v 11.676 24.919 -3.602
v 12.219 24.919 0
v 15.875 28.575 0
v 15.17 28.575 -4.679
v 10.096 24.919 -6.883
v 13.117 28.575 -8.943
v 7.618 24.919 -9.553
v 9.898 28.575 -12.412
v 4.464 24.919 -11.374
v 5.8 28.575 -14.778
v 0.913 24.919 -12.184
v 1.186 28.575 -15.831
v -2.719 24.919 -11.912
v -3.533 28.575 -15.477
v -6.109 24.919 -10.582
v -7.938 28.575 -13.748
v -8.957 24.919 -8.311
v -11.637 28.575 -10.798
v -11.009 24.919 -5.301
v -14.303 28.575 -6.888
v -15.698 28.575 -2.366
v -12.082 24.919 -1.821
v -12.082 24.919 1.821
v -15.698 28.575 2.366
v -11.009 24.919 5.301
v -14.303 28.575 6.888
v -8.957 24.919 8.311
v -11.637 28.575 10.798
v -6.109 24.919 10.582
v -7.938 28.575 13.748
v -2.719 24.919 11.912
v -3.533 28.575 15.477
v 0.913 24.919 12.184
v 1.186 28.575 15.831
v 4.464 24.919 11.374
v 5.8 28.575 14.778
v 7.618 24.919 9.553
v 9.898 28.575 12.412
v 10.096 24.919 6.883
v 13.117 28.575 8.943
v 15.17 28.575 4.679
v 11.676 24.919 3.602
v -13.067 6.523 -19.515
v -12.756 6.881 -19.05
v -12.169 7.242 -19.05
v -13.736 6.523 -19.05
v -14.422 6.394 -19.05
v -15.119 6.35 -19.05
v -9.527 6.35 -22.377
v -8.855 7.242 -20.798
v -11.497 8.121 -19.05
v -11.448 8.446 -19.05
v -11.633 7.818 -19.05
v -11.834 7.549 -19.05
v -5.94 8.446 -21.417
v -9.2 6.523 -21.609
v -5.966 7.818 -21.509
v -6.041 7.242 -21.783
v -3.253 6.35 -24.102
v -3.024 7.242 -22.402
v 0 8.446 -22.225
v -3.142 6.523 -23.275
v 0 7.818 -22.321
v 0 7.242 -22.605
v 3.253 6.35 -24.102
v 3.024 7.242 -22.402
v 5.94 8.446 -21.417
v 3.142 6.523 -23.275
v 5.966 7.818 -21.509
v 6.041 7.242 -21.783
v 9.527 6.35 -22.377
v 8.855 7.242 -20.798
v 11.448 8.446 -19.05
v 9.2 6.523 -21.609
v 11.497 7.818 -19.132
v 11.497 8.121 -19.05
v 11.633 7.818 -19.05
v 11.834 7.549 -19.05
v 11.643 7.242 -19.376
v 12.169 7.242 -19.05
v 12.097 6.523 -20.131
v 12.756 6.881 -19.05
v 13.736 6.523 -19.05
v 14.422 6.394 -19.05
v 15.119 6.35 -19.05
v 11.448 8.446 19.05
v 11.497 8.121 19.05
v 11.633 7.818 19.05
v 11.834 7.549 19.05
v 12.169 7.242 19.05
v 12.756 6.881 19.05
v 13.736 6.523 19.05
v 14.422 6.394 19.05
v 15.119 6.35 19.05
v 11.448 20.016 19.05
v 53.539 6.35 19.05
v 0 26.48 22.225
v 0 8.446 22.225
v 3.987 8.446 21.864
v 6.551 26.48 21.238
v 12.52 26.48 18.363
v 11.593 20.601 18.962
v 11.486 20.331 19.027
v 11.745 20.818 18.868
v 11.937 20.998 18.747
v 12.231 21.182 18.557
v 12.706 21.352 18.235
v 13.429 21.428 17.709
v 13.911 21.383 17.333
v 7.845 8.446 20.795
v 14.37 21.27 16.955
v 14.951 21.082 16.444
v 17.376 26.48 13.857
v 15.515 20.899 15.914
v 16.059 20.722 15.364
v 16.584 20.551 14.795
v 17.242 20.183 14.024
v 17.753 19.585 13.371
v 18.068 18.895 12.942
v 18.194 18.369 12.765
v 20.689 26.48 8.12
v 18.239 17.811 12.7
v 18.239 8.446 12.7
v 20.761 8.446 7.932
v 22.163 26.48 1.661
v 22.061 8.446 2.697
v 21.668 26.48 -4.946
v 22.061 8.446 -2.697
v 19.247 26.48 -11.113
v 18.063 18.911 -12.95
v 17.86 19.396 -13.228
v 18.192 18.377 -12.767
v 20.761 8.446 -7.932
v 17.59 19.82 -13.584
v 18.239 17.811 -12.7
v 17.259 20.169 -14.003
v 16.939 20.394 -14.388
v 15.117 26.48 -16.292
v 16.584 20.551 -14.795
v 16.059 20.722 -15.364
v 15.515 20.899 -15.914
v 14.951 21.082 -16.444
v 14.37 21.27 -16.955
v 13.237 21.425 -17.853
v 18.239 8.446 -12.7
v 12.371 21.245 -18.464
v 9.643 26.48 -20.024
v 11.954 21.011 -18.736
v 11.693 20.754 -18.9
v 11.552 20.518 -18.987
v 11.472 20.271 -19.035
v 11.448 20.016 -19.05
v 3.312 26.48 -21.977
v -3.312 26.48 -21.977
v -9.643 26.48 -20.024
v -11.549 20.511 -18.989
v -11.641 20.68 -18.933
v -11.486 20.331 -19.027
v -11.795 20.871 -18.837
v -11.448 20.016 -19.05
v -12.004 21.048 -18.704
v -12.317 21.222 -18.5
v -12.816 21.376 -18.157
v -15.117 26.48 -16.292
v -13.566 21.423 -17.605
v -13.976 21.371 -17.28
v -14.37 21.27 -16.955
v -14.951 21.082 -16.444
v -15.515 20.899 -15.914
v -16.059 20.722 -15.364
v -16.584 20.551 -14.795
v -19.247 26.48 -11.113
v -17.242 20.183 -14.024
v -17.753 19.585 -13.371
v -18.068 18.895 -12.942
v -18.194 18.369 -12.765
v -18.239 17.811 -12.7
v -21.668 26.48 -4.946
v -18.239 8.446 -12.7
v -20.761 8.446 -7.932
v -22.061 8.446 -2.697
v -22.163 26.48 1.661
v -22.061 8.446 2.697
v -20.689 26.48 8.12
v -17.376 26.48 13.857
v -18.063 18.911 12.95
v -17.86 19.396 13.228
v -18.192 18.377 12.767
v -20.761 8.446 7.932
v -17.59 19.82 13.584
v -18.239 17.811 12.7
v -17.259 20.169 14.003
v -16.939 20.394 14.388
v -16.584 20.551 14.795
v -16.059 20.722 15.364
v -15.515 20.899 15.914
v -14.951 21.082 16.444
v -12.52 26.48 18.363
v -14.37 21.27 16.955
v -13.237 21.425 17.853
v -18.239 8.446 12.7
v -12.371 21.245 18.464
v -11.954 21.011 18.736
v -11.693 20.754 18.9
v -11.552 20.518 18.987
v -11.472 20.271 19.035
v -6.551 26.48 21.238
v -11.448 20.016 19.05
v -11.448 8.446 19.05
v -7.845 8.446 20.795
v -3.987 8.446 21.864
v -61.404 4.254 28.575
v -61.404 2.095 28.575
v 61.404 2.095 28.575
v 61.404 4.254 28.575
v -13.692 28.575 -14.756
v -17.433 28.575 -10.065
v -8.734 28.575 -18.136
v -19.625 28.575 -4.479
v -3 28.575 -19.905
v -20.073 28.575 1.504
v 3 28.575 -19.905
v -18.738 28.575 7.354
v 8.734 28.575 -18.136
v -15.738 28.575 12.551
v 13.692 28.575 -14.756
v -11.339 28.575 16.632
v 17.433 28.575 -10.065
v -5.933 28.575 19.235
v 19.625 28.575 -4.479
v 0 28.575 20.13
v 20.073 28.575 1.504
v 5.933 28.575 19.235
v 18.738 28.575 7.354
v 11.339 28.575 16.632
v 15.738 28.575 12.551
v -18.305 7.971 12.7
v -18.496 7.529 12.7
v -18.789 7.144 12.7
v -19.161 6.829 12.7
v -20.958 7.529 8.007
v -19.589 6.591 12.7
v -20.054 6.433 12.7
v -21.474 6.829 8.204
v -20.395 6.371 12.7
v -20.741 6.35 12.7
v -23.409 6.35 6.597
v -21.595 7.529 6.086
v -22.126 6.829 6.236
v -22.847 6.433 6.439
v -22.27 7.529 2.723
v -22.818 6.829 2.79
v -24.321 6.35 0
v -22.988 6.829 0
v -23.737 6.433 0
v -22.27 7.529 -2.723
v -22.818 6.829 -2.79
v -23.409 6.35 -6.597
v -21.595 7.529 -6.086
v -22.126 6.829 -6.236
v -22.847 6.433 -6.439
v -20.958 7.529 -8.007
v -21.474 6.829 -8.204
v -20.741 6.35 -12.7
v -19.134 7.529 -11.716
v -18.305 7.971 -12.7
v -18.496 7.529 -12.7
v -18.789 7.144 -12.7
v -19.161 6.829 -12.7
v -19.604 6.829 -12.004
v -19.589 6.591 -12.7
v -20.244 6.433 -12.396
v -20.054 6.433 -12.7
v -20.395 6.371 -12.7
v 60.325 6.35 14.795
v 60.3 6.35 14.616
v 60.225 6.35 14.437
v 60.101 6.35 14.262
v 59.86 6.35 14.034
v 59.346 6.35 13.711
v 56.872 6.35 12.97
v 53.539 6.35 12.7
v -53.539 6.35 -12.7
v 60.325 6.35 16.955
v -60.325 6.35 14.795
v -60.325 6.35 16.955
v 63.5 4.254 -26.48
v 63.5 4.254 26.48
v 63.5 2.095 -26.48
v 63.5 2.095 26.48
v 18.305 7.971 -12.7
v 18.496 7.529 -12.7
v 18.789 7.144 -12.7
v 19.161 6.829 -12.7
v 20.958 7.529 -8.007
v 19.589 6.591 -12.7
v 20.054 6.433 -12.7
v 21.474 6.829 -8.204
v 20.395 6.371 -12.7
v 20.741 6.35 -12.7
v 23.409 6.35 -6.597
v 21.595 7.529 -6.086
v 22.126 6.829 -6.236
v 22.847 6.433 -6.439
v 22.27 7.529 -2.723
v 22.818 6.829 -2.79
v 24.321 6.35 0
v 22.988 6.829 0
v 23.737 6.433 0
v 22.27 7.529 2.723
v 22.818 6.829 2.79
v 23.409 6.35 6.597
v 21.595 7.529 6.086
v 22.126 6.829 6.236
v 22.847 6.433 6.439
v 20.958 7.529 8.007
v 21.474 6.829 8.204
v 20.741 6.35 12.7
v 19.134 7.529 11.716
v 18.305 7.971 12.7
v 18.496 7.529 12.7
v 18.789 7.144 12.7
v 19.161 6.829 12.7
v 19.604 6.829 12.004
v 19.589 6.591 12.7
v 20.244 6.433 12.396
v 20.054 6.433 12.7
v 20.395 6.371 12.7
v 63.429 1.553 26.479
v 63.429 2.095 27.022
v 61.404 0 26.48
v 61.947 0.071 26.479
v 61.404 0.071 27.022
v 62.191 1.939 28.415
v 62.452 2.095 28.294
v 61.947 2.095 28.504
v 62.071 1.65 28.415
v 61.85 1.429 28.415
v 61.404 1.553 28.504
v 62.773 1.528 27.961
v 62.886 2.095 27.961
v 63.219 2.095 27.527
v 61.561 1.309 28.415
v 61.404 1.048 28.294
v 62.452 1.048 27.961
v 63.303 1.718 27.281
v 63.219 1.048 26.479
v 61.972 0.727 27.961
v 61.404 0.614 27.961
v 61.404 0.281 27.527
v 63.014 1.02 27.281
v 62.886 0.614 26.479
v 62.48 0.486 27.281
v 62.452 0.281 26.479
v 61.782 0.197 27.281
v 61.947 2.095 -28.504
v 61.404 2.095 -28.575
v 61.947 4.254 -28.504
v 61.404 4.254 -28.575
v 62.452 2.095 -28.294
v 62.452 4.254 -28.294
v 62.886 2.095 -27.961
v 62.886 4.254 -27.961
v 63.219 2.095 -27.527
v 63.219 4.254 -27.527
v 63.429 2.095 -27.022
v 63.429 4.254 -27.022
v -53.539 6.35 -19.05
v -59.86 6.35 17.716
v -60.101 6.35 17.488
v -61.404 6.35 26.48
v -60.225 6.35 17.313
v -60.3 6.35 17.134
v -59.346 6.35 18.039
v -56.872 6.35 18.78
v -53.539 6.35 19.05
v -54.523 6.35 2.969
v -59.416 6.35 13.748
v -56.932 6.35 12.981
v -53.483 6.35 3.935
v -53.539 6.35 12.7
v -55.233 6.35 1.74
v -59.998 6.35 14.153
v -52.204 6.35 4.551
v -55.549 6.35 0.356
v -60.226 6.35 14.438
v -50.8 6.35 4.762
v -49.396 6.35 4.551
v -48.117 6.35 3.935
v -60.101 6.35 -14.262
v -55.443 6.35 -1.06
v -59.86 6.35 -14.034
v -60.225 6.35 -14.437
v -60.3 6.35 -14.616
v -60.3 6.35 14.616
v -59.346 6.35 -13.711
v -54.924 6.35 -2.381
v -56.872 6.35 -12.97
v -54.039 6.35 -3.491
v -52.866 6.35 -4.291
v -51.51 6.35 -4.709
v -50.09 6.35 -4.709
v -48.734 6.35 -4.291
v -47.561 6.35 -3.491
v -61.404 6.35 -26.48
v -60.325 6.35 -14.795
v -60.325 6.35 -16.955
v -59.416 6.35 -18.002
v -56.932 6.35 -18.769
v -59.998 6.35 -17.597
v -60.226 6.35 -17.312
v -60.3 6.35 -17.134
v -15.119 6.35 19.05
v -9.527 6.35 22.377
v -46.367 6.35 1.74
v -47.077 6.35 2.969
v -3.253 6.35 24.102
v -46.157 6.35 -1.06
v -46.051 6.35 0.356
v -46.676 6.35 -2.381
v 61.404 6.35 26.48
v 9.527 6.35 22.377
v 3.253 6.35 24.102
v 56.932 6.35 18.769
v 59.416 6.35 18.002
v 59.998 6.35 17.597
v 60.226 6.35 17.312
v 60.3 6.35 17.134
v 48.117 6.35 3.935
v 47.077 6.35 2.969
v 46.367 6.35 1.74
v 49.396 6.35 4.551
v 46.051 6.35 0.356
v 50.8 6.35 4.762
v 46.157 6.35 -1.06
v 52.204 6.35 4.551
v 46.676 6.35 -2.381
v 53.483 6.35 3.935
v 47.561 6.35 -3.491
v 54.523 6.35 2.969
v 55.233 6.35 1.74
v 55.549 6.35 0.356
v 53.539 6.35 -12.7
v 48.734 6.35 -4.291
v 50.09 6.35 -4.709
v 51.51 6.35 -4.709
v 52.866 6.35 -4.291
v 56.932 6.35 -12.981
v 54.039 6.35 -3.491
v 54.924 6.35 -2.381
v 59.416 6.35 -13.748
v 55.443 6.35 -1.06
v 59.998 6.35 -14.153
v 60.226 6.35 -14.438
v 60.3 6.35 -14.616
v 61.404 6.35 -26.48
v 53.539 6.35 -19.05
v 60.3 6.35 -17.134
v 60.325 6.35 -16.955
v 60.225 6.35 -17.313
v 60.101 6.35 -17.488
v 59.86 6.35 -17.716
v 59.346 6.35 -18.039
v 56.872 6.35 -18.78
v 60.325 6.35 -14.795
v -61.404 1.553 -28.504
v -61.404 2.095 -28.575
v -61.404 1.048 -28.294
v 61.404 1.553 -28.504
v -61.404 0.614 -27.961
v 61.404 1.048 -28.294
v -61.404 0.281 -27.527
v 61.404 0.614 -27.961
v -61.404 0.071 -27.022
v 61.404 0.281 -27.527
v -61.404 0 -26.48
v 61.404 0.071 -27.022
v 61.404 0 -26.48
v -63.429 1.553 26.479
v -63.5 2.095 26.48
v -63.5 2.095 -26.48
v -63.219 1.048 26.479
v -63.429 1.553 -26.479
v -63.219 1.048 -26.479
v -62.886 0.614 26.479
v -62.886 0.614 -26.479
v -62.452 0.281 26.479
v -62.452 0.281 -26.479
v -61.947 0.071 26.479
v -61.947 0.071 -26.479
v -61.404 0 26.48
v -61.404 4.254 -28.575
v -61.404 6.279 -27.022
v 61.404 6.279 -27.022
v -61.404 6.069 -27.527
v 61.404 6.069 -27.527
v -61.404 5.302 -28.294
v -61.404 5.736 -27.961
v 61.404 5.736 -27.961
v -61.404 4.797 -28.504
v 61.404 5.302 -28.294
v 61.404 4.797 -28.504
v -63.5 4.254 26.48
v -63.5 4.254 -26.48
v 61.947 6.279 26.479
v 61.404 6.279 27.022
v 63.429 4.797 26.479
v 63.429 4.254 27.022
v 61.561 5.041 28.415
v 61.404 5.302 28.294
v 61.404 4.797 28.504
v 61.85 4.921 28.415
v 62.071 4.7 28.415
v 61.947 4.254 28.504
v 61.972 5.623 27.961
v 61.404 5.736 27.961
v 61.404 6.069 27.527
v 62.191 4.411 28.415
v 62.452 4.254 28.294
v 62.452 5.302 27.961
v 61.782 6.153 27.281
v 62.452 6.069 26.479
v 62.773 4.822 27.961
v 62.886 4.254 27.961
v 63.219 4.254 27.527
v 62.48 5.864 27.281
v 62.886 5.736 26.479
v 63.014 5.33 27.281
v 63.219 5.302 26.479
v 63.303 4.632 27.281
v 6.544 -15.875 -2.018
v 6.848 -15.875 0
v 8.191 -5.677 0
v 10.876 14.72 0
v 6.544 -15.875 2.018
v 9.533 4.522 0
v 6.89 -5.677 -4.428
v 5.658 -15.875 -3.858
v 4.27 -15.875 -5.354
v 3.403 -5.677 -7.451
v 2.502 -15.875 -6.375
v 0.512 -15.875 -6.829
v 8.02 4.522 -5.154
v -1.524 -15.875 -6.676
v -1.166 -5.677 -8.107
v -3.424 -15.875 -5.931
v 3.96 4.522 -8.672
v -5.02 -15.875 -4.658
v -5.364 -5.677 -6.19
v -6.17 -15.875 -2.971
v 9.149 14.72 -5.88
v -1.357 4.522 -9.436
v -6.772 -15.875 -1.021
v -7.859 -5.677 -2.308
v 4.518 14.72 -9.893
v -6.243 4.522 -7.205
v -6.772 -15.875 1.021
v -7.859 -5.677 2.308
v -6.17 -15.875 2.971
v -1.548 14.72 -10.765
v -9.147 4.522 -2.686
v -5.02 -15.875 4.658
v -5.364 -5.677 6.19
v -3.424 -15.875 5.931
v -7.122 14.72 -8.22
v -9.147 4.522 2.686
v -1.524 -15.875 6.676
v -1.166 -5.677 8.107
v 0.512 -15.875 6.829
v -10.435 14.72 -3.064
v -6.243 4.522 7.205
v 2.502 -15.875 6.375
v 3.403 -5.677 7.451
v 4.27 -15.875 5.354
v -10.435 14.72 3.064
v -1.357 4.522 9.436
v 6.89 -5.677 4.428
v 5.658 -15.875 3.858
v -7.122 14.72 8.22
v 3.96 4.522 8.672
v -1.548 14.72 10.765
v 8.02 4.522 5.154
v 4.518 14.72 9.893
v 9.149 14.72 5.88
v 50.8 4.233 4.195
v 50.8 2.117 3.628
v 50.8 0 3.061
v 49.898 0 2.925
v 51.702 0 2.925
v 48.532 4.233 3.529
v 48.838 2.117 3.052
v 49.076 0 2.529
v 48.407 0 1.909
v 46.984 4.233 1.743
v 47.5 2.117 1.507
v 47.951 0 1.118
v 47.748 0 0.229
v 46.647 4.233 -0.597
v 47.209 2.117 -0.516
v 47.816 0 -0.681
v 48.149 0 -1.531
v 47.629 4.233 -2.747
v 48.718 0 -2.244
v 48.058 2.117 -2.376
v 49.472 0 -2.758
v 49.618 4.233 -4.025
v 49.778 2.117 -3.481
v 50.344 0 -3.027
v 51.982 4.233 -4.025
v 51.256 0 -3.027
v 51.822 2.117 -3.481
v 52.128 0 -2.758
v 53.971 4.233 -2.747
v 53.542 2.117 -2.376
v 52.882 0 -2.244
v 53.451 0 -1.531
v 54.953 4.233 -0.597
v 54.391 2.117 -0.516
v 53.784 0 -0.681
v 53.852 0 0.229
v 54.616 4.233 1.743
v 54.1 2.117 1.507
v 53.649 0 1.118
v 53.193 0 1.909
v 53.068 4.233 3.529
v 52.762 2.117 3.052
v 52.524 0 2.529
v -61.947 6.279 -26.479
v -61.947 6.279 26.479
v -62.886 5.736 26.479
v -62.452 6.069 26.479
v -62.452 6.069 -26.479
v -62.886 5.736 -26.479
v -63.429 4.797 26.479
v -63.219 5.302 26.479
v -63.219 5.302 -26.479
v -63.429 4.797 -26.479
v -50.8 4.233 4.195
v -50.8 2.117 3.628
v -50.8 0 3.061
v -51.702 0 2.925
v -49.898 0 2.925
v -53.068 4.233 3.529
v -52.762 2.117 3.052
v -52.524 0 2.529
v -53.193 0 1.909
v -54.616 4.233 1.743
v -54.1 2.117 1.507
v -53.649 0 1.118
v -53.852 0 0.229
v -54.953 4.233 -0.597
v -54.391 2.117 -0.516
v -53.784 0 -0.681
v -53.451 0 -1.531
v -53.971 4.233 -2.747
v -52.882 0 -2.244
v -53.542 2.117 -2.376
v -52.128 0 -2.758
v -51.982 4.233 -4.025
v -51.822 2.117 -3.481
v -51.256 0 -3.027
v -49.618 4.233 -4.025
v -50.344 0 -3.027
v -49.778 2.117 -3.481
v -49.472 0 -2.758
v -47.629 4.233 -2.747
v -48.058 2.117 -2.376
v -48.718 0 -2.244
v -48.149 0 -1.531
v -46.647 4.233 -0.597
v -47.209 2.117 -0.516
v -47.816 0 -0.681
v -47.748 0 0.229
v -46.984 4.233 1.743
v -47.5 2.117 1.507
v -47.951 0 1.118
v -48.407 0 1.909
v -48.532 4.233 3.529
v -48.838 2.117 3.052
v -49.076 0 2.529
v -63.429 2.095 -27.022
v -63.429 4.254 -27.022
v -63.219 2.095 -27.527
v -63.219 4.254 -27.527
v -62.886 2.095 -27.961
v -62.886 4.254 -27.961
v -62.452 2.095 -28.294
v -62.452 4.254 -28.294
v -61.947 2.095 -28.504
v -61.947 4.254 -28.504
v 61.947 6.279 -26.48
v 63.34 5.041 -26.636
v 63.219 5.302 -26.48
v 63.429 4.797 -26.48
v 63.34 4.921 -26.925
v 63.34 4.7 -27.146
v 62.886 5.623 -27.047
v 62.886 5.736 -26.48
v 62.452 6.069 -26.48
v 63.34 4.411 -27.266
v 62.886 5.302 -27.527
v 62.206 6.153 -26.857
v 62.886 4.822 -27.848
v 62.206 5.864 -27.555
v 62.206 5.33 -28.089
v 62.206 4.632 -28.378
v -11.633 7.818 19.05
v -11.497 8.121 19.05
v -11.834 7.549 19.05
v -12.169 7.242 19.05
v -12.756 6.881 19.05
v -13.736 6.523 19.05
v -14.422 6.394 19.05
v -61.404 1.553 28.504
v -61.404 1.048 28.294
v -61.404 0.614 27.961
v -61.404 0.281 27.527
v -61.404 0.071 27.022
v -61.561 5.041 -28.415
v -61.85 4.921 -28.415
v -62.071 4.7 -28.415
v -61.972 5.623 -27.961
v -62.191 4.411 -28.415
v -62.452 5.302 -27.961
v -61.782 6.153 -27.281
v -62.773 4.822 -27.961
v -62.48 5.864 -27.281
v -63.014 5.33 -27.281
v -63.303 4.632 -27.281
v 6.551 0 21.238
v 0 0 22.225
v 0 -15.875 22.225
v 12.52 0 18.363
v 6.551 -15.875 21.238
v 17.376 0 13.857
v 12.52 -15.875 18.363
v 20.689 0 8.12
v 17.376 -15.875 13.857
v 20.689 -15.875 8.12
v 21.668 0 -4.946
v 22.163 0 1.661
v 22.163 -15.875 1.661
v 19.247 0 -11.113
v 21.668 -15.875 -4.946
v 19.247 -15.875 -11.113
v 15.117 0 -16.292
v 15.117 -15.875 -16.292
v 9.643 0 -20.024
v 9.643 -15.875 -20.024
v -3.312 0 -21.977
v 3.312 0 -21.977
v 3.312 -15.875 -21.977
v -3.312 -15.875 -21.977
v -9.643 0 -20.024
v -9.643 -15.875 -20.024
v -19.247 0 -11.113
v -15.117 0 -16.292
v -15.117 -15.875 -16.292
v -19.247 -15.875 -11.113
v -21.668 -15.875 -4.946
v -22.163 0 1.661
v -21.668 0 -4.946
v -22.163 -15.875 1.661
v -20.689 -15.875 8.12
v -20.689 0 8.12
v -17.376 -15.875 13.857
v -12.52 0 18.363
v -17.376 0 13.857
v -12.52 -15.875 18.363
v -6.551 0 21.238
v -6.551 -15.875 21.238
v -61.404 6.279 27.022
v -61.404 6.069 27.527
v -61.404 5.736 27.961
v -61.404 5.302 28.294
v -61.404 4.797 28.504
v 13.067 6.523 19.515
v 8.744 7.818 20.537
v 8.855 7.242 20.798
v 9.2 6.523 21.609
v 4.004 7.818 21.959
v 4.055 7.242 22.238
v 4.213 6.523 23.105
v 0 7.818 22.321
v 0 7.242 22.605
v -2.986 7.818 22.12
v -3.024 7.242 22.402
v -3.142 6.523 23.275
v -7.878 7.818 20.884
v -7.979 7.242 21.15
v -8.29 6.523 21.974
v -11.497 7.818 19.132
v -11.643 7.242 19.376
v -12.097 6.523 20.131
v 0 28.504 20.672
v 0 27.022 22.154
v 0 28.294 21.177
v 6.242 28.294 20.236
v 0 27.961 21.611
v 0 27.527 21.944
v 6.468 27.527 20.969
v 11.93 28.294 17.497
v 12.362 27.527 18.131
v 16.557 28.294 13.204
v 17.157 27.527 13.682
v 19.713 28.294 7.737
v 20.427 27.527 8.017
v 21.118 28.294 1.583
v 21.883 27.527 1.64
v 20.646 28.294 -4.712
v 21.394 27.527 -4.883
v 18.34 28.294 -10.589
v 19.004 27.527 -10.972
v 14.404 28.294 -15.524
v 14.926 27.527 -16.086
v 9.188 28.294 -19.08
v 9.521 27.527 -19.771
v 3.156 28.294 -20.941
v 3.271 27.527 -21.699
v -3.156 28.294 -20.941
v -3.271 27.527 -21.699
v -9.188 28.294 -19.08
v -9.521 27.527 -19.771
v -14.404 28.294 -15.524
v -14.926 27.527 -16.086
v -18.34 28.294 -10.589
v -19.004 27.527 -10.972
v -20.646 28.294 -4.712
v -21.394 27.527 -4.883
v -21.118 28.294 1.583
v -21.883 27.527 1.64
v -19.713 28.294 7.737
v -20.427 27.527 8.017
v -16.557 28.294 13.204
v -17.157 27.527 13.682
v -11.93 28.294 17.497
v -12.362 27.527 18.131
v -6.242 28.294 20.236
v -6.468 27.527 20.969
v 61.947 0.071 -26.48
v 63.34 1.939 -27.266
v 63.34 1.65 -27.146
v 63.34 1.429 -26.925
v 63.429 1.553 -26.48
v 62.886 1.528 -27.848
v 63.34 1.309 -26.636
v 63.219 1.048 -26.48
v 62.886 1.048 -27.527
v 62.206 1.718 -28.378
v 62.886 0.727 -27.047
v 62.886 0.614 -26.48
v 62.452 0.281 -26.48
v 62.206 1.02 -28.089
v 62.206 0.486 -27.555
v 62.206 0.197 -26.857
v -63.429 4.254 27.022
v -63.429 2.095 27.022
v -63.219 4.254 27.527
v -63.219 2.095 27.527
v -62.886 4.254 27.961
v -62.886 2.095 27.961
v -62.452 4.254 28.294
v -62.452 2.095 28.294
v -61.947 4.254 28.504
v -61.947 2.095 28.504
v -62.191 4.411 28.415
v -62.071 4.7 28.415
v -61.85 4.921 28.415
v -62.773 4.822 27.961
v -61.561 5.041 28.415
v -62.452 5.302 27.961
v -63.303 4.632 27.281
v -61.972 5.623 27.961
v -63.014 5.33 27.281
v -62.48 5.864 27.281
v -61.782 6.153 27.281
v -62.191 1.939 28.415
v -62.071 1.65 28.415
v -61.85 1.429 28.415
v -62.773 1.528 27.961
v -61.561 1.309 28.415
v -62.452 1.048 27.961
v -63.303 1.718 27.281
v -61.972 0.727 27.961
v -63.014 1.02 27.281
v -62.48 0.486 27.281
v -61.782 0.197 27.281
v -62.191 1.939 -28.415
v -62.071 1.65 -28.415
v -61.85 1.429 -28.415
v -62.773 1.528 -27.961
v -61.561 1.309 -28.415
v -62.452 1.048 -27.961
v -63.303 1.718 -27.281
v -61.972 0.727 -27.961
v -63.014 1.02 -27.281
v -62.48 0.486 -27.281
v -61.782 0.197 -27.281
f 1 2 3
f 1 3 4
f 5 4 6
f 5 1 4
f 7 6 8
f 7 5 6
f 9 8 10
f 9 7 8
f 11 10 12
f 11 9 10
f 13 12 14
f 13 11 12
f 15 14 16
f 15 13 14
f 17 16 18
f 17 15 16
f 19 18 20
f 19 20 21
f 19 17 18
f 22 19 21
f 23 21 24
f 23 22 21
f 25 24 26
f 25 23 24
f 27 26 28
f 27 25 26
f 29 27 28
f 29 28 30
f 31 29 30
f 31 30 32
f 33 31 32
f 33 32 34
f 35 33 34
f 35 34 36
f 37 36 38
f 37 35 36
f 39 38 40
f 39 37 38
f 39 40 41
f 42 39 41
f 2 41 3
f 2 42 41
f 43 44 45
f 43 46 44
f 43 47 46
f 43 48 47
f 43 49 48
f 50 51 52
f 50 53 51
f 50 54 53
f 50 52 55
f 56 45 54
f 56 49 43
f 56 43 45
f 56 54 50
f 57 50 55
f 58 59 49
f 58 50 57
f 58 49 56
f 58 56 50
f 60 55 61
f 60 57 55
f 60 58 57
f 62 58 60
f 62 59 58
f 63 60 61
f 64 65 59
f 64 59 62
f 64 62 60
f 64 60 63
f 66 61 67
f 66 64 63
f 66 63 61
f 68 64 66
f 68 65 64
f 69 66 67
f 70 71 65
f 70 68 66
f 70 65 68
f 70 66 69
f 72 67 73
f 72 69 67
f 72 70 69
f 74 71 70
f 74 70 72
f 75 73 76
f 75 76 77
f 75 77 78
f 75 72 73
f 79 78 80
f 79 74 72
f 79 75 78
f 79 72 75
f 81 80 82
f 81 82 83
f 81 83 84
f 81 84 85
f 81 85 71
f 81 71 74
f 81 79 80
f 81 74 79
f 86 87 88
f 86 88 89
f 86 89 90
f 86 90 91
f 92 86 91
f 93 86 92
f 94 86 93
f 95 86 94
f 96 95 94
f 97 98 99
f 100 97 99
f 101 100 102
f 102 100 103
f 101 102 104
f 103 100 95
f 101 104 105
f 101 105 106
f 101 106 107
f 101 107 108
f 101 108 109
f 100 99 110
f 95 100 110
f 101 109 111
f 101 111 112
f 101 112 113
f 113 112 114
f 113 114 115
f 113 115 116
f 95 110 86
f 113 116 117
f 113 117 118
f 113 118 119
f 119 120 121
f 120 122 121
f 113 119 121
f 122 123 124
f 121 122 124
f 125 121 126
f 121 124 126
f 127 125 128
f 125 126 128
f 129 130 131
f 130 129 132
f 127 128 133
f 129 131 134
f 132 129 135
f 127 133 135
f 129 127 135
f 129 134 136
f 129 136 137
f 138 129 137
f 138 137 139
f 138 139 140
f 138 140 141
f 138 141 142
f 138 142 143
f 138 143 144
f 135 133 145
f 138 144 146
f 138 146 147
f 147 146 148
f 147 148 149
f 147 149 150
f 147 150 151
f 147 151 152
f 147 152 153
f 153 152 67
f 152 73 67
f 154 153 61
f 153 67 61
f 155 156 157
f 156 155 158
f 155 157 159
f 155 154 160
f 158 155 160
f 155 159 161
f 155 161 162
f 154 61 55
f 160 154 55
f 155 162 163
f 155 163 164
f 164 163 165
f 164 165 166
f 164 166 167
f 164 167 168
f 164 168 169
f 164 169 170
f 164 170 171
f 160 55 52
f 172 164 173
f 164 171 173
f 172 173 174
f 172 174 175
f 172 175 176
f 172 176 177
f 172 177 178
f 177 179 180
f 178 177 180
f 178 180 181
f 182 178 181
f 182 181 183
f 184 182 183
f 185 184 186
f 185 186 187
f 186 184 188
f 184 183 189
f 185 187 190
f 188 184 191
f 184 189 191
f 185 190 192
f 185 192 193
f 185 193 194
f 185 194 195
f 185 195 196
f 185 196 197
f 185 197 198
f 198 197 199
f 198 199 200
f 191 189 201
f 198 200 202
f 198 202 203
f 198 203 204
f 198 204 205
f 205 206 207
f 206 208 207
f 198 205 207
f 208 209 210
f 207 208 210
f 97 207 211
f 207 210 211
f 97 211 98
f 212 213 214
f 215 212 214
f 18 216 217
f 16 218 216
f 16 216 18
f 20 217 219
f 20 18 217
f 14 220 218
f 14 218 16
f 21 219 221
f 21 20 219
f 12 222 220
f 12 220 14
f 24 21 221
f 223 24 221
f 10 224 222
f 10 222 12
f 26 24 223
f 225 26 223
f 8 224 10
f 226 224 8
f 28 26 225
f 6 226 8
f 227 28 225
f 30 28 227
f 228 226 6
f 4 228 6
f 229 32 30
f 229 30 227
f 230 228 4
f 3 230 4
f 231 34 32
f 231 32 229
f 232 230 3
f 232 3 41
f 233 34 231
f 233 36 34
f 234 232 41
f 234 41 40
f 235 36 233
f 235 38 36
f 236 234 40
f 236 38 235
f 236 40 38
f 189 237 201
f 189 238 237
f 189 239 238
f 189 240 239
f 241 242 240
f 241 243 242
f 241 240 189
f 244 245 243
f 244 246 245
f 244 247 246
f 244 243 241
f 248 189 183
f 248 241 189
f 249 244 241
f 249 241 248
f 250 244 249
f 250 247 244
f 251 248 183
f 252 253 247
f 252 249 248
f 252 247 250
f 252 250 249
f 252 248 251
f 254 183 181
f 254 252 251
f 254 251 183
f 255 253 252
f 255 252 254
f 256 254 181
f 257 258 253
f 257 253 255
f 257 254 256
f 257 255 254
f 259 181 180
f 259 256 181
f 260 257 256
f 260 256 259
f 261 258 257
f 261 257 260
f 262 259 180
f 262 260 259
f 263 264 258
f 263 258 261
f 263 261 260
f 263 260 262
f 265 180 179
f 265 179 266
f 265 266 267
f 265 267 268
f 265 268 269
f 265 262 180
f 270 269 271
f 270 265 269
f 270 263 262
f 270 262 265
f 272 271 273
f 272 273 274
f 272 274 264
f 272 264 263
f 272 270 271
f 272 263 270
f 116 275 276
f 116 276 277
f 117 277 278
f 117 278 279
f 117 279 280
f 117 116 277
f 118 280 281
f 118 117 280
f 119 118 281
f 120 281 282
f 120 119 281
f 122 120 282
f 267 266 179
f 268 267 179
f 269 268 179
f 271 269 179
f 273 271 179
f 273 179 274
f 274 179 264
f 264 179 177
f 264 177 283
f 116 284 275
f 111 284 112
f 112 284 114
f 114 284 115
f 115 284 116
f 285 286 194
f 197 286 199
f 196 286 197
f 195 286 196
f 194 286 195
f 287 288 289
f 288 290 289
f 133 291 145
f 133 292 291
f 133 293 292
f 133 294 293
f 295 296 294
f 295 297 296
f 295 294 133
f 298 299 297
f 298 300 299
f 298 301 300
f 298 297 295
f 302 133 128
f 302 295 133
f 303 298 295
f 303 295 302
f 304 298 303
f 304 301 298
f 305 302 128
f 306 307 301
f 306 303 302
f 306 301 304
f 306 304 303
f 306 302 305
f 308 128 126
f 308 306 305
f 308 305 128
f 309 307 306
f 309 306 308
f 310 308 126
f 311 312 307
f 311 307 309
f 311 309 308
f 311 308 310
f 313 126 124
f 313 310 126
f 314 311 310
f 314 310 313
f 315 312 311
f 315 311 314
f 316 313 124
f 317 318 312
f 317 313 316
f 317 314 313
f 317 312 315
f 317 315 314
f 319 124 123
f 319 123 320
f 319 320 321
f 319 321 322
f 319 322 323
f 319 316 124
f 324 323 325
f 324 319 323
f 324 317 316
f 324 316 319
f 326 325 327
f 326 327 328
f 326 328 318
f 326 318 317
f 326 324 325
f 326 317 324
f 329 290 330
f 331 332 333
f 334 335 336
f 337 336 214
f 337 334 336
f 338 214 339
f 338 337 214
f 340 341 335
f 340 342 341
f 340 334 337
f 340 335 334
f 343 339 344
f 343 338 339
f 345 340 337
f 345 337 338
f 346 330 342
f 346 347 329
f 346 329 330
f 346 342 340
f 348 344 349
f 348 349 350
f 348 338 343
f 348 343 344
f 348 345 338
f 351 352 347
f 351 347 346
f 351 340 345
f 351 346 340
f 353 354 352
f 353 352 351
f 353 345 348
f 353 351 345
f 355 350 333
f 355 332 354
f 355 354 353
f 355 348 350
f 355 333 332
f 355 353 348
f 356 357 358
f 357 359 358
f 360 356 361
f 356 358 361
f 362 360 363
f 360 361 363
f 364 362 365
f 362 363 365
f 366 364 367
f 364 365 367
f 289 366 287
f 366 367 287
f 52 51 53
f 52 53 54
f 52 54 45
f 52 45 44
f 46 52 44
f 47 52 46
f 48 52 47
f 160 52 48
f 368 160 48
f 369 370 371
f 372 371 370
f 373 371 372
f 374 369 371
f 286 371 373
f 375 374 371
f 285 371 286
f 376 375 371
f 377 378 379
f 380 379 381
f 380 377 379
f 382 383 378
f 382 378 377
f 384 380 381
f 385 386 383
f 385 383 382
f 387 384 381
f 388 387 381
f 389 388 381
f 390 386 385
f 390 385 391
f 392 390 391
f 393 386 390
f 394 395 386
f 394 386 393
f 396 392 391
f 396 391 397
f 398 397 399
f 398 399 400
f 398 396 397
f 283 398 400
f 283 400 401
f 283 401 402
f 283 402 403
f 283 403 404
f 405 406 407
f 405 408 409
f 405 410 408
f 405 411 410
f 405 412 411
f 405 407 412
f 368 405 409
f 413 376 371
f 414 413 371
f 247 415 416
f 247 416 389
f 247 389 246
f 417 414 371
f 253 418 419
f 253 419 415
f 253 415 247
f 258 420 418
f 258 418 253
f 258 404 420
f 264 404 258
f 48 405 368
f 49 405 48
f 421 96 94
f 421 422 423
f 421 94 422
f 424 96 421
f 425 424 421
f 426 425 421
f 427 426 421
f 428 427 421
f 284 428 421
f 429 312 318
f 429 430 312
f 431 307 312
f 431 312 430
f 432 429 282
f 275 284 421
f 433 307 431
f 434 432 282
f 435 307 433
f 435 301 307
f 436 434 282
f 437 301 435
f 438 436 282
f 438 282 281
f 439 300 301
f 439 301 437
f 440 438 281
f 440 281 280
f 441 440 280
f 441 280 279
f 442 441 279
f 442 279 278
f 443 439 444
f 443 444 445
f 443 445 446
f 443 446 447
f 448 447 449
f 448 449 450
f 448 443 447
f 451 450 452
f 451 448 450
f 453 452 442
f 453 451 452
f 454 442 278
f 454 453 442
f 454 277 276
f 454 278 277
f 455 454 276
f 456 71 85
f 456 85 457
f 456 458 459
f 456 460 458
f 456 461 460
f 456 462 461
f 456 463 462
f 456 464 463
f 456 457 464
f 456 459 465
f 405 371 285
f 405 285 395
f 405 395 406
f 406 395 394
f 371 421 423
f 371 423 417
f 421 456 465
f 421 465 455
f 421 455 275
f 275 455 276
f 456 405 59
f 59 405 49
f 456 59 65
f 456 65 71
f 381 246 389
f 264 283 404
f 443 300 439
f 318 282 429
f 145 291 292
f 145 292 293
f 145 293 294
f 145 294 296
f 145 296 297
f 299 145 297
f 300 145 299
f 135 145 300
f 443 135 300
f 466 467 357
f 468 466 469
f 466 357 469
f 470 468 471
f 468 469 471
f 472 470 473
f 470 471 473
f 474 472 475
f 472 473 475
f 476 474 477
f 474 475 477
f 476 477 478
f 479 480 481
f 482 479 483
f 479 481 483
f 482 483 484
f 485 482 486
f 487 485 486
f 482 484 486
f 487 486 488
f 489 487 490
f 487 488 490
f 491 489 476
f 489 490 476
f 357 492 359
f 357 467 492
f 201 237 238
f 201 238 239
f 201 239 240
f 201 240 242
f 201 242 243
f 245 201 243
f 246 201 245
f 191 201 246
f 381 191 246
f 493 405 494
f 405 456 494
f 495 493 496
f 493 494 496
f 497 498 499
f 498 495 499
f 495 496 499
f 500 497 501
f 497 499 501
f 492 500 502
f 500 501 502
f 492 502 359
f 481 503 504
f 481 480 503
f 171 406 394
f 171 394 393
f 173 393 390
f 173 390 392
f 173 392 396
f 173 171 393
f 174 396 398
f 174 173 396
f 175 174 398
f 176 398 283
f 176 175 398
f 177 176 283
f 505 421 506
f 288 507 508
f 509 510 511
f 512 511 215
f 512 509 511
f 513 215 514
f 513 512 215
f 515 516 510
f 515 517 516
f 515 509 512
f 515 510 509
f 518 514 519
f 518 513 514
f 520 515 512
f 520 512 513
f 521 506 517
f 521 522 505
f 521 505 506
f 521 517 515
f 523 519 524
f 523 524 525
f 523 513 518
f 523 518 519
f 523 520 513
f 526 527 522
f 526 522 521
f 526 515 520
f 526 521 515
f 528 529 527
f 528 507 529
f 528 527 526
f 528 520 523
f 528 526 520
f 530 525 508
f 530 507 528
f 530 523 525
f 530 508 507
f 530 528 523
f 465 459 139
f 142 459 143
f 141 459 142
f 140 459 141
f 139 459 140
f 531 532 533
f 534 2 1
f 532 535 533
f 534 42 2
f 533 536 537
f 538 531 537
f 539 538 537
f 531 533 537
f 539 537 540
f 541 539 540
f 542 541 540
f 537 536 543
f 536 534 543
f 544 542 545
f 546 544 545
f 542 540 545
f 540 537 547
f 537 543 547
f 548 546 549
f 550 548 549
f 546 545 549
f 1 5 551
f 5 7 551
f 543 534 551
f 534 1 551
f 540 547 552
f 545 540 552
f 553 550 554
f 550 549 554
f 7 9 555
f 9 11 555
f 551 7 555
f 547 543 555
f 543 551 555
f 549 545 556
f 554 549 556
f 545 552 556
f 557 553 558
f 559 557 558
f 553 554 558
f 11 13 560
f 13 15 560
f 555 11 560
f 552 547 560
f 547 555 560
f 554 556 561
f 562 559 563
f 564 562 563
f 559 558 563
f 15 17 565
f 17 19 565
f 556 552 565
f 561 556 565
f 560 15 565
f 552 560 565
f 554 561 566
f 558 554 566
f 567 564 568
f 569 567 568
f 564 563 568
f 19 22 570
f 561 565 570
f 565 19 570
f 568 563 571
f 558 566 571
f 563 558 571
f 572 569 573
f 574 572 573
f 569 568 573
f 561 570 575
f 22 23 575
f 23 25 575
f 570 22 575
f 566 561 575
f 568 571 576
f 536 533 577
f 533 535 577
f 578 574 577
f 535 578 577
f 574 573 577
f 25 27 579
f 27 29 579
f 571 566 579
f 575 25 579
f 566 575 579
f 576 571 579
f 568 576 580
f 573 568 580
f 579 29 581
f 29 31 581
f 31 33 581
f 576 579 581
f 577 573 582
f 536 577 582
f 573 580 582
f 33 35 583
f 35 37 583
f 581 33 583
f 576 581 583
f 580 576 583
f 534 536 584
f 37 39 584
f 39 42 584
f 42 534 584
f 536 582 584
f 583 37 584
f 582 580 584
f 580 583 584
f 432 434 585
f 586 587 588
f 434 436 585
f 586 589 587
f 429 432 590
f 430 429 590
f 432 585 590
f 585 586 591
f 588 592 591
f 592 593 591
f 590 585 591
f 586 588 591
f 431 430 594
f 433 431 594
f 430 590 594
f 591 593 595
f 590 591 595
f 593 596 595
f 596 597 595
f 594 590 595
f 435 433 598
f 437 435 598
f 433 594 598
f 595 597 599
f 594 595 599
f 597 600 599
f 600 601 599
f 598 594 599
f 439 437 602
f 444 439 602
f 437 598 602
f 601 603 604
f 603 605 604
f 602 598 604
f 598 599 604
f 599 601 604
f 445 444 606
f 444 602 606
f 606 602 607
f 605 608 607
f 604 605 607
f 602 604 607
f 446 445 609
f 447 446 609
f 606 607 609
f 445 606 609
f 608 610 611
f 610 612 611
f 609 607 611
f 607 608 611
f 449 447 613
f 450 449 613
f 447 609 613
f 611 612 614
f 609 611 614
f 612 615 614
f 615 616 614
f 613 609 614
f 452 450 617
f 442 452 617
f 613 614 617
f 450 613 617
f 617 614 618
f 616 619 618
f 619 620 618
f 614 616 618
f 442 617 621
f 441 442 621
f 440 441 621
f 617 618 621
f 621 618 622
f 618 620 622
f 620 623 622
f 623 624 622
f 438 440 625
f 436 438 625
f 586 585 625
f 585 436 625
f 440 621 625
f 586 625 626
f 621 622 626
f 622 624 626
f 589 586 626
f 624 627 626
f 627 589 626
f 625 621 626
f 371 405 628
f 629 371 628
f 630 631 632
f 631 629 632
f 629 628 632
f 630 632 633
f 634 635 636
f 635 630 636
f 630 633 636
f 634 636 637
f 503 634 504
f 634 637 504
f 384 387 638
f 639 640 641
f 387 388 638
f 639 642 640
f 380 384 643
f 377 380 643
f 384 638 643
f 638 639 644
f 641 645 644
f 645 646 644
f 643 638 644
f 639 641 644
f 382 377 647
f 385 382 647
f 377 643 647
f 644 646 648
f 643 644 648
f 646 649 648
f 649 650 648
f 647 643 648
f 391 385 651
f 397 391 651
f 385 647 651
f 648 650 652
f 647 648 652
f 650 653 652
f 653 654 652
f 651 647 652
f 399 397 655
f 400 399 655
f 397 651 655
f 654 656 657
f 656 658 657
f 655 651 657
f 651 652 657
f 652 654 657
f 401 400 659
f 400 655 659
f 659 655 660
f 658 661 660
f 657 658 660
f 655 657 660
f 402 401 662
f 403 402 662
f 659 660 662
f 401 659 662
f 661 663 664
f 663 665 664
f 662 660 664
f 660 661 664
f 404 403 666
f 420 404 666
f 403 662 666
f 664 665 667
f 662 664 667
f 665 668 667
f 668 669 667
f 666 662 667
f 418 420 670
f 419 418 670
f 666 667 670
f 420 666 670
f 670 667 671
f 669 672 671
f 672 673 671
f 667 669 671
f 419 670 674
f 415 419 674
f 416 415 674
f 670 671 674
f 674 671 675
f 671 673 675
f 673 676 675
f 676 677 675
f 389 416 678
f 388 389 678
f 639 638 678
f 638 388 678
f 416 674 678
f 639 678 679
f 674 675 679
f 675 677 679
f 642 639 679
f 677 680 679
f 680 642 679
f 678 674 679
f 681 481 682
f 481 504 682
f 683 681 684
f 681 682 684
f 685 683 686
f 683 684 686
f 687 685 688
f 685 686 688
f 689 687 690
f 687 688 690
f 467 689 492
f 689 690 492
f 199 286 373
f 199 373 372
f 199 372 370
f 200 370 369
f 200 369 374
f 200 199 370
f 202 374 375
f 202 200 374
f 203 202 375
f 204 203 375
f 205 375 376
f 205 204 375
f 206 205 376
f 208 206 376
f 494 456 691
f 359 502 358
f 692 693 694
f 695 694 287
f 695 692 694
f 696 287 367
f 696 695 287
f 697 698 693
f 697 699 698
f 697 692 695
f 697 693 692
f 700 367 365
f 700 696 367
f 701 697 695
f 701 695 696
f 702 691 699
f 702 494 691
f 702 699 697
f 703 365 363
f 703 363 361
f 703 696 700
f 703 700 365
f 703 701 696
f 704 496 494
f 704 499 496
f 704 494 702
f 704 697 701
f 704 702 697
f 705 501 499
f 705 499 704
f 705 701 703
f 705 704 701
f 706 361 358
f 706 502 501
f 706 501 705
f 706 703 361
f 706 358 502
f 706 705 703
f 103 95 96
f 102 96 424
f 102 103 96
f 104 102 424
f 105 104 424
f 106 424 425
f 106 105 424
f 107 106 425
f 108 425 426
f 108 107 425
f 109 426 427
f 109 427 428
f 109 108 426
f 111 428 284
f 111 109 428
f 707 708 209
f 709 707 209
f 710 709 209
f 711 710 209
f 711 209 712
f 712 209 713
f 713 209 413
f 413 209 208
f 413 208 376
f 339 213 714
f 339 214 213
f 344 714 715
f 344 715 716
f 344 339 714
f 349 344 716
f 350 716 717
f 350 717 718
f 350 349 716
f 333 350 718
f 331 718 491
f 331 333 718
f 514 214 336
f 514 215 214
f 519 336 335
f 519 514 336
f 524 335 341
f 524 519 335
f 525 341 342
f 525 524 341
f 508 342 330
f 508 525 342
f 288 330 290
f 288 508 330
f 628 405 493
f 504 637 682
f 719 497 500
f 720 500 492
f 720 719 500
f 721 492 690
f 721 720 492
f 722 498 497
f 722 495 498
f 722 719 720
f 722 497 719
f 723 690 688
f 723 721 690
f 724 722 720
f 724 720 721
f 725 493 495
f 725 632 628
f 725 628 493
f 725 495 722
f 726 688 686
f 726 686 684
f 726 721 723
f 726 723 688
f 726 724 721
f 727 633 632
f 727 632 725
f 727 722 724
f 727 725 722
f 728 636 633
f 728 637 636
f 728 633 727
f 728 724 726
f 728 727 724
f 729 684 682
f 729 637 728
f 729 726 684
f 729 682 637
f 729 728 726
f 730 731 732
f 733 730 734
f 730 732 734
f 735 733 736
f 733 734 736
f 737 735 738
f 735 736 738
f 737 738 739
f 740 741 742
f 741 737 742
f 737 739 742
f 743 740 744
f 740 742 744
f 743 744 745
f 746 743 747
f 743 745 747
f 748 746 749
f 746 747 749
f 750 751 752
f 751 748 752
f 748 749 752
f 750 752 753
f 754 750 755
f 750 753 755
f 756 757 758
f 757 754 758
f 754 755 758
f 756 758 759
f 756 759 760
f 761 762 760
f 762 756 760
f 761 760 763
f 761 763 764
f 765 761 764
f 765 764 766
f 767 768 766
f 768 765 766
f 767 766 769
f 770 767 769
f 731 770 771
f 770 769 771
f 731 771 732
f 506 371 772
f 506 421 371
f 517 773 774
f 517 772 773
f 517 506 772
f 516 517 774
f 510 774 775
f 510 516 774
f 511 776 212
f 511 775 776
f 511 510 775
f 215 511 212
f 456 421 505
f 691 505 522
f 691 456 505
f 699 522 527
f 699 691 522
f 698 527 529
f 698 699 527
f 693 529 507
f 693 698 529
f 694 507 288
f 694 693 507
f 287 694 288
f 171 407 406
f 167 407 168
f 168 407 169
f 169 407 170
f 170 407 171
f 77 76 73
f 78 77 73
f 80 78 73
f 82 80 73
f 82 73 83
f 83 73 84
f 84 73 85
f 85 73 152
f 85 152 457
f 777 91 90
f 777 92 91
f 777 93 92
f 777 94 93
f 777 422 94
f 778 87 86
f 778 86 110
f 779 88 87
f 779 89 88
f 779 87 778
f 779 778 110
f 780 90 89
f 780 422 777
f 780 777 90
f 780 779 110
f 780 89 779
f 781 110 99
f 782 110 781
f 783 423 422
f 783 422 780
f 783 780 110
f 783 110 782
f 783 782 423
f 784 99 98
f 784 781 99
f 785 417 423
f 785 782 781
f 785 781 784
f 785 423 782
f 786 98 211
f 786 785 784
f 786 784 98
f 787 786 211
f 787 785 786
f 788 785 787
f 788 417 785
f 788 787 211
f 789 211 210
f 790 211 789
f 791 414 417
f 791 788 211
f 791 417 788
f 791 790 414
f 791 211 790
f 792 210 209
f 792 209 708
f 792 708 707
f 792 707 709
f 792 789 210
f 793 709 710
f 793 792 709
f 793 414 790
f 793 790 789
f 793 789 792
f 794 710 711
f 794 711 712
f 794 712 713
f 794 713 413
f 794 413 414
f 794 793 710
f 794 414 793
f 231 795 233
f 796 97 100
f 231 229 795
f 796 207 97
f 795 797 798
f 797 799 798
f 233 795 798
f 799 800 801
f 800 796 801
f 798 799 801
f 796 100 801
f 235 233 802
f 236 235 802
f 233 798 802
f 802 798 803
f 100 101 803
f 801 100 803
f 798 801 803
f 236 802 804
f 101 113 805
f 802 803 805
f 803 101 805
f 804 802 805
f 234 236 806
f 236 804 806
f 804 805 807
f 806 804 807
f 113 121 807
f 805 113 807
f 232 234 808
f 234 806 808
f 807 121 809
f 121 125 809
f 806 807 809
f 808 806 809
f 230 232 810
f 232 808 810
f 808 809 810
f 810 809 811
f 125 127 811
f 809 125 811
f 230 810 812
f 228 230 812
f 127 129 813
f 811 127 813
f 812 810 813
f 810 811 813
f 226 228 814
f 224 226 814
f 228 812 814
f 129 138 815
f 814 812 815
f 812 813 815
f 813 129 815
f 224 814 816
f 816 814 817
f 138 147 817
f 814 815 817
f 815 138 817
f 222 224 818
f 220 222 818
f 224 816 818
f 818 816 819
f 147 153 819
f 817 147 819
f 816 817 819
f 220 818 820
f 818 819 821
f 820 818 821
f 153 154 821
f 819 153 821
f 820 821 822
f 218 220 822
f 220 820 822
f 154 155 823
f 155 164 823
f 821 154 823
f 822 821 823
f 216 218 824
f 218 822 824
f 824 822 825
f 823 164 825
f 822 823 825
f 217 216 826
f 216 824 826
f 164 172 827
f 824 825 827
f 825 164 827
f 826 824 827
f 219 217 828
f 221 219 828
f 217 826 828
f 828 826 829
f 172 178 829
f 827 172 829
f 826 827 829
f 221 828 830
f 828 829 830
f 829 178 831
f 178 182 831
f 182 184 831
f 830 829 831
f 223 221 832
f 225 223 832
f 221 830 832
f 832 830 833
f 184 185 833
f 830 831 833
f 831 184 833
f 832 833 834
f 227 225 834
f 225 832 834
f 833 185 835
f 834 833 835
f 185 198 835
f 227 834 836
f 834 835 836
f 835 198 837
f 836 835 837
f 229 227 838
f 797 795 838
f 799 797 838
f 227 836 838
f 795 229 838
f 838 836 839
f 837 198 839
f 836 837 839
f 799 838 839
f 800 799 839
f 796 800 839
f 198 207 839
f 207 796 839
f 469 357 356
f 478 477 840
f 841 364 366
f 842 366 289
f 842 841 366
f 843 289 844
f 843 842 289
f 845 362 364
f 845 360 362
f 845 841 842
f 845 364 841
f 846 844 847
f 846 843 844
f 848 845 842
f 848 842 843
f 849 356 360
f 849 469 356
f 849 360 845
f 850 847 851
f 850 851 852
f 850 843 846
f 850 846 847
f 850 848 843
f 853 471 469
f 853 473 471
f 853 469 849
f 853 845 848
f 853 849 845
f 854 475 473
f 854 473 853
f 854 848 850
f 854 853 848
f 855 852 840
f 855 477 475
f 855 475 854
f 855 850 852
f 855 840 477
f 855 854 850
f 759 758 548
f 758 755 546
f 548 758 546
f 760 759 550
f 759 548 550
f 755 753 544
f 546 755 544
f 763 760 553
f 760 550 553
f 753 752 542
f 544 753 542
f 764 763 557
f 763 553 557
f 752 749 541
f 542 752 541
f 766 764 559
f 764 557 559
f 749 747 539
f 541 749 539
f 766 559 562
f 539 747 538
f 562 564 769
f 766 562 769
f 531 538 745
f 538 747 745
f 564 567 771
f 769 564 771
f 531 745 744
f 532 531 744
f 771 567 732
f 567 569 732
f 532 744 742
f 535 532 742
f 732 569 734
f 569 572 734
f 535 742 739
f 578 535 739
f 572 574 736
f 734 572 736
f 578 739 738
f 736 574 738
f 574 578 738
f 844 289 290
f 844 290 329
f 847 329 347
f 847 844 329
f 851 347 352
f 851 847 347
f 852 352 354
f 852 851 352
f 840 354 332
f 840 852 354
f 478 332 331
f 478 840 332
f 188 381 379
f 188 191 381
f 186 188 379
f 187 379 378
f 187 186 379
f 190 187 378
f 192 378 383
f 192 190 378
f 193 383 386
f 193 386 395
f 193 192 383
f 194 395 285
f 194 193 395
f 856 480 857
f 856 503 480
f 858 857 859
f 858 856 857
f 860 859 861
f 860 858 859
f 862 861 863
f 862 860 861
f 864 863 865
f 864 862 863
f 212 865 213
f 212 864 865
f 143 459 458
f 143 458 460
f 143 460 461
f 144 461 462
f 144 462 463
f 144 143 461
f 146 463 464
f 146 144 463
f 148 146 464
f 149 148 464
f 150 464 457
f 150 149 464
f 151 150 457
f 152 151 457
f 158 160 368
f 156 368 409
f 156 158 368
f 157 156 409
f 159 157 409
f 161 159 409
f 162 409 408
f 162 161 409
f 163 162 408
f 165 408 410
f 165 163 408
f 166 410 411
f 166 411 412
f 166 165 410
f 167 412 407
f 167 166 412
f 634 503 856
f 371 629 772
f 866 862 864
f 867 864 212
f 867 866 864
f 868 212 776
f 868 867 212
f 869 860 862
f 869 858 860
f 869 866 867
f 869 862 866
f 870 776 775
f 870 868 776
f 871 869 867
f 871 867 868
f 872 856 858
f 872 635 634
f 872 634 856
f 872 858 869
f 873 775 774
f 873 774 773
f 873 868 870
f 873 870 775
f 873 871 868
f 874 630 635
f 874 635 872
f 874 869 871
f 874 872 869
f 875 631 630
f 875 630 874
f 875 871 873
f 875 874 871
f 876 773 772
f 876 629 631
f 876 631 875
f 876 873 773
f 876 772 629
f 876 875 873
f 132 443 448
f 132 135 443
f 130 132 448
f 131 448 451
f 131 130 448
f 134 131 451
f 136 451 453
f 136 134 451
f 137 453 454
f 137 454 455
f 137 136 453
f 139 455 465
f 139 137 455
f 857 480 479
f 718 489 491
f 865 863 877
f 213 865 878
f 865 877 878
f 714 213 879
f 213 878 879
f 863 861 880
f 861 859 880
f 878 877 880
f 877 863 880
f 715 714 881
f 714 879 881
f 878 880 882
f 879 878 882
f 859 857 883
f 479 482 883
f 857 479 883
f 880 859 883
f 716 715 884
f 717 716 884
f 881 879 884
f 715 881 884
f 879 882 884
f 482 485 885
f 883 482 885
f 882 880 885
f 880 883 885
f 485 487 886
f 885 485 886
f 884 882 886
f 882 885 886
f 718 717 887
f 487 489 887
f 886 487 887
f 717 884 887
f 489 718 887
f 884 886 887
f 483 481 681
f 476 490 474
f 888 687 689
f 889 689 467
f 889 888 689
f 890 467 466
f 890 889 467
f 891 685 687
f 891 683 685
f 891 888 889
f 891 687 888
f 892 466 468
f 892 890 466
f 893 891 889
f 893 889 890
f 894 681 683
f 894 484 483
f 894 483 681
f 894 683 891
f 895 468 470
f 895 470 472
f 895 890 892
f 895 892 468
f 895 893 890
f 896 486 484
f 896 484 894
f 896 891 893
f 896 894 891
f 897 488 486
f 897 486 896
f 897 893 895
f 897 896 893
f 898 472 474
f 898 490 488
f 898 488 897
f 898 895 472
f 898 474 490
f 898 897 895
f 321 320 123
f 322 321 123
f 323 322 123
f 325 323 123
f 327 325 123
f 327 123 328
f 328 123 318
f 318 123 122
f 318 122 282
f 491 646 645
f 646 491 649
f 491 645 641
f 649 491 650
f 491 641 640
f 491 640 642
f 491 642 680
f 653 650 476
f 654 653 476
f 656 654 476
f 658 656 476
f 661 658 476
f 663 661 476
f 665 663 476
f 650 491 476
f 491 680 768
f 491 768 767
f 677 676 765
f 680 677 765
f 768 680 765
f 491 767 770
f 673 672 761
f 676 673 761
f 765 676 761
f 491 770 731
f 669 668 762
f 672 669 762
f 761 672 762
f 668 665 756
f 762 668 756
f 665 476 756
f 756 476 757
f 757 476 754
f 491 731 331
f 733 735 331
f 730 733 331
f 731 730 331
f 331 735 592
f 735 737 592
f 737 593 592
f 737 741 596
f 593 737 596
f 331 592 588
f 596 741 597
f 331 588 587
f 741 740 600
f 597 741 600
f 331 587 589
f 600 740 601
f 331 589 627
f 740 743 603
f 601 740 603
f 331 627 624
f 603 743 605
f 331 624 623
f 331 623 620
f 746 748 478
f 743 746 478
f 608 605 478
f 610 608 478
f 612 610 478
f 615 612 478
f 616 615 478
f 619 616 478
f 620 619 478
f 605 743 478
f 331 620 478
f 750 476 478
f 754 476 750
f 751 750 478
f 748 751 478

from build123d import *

# Parameters (mm, degrees)
SKETCH1_W                = 127
SKETCH1_H                = 57.15
BOSS_EXTRUDE1_DEPTH      = 6.35
BOSS_EXTRUDE2_DEPTH      = 22.225
BOSS_EXTRUDE2_DEPTH_BACK = 22.225
SKETCH3_R                = 22.225
SKETCH4_R                = 12.7
CUT_EXTRUDE2_DEPTH       = 83.611035128
CUT_EXTRUDE2_DRAFT       = -7.5
BOSS_EXTRUDE3_DEPTH      = 6.35
CHAMFER1_SIZE            = 3.175
CHAMFER1_SIZE2           = 3.687920954
FILLET1_R                = 2.0955


with BuildPart() as part:
    # Sketch1 → Boss-Extrude1 (new body)
    with BuildSketch(Plane(origin=(0, 0, 0), x_dir=(1, 0, 0), z_dir=(0, 1, 0))):
        Rectangle(SKETCH1_W, SKETCH1_H)
    extrude(amount=BOSS_EXTRUDE1_DEPTH)

    # Cut-Extrude1 cone 1 section (through the dimple's axis) → Cut-Extrude1 (revolve, cut)
    with BuildSketch(Plane(origin=(-50.8, 6.35, 0), x_dir=(0, 0, 1), z_dir=(1, 0, 0))):
        Polygon((0, 0), (4.7625, 0), (0, 17.773891971), align=None)
    revolve(axis=Axis((-50.8, 6.35, 0), (0, -1, 0)), mode=Mode.SUBTRACT)

    # Cut-Extrude1 cone 2 section (through the dimple's axis) → Cut-Extrude1 cone 2 (revolve, cut)
    with BuildSketch(Plane(origin=(50.8, 6.35, 0), x_dir=(0, 0, 1), z_dir=(1, 0, 0))):
        Polygon((0, 0), (4.7625, 0), (0, 17.773891971), align=None)
    revolve(axis=Axis((50.8, 6.35, 0), (0, -1, 0)), mode=Mode.SUBTRACT)

    # Sketch3 → Boss-Extrude2 (add, two sides: drawn at the far end of the back side and taken through both)
    with BuildSketch(Plane(origin=(0, 6.35, 0), x_dir=(1, 0, 0), z_dir=(0, 1, 0)).offset(-BOSS_EXTRUDE2_DEPTH_BACK)):
        with Locations(Location((0, 0, 0), (0, 0, 270))):
            Circle(SKETCH3_R)
    extrude(amount=BOSS_EXTRUDE2_DEPTH + BOSS_EXTRUDE2_DEPTH_BACK)


with BuildPart() as cut_extrude2_tool:
    # Sketch4 → Cut-Extrude2 (with draft: the straight prism first)
    with BuildSketch(Plane(origin=(0, 28.575, 0), x_dir=(1, 0, 0), z_dir=(0, 1, 0))):
        Circle(SKETCH4_R)
    extrude(amount=-CUT_EXTRUDE2_DEPTH)
    # Cut-Extrude2: the draft: its side faces are tilted about the plane it starts from
    cut_extrude2_sides = [cut_extrude2_tool.faces().sort_by_distance(p)[0] for p in [
        (-12.7, -13.230517564, 0),
    ]]
    draft(cut_extrude2_sides, Plane(origin=(0, 28.575, 0), x_dir=(1, 0, 0), z_dir=(0, 1, 0)), CUT_EXTRUDE2_DRAFT)


with BuildPart() as part_1:
    add(part.part)

    # Cut-Extrude2: cut by cut_extrude2_tool
    add(cut_extrude2_tool.part, mode=Mode.SUBTRACT)

    # Sketch5 → Boss-Extrude3 (add)
    with BuildSketch(Plane.XY.offset(19.05)):
        Polygon((11.43, 22.225), (11.43, 6.35), (60.325, 6.35), align=None)
        Polygon((-11.43, 22.225), (-11.43, 6.35), (-60.325, 6.35), align=None)
    boss_extrude3 = extrude(amount=-BOSS_EXTRUDE3_DEPTH)

    # Mirror1: Boss-Extrude3 across plane
    add(boss_extrude3.mirror(Plane.XY))

    # Chamfer1
    chamfer1_edges = [part_1.edges().sort_by_distance(p)[0] for p in [
        (-12.7, 28.575, 0),
    ]]
    chamfer1_side = [part_1.faces().sort_by_distance(p)[0] for p in [
        (0, 28.575, -21.596382072),
    ]]
    chamfer(chamfer1_edges, length=CHAMFER1_SIZE, length2=CHAMFER1_SIZE2, reference=chamfer1_side[0])

    # Fillet1
    fillet1_edges = [part_1.edges().sort_by_distance(p)[0] for p in [
        (35.88631265, 14.28463875, 19.05),
        (39.281993201, 13.182145064, 12.7),
        (35.88631265, 14.28463875, -19.05),
        (39.281993201, 13.182145064, -12.7),
        (-39.281993201, 13.182145064, 12.7),
        (-35.88631265, 14.28463875, 19.05),
        (-39.281993201, 13.182145064, -12.7),
        (-35.88631265, 14.28463875, -19.05),
        (-22.225, 6.35, 0),
        (5.939881102, 6.35, 21.416545882),
        (22.225, 6.35, 0),
        (0, 6.35, -22.225),
        (-63.5, 6.35, 0),
        (-63.5, 0, 0),
        (0, 6.35, -28.575),
        (-63.5, 3.175, -28.575),
        (0, 0, -28.575),
        (63.5, 6.35, 0),
        (63.5, 3.175, -28.575),
        (63.5, 0, 0),
        (-63.5, 3.175, 28.575),
        (0, 6.35, 28.575),
        (63.5, 3.175, 28.575),
        (0, 0, 28.575),
        (0, 28.575, -22.225),
    ]]
    fillet(fillet1_edges, radius=FILLET1_R)


solid = part_1.part
